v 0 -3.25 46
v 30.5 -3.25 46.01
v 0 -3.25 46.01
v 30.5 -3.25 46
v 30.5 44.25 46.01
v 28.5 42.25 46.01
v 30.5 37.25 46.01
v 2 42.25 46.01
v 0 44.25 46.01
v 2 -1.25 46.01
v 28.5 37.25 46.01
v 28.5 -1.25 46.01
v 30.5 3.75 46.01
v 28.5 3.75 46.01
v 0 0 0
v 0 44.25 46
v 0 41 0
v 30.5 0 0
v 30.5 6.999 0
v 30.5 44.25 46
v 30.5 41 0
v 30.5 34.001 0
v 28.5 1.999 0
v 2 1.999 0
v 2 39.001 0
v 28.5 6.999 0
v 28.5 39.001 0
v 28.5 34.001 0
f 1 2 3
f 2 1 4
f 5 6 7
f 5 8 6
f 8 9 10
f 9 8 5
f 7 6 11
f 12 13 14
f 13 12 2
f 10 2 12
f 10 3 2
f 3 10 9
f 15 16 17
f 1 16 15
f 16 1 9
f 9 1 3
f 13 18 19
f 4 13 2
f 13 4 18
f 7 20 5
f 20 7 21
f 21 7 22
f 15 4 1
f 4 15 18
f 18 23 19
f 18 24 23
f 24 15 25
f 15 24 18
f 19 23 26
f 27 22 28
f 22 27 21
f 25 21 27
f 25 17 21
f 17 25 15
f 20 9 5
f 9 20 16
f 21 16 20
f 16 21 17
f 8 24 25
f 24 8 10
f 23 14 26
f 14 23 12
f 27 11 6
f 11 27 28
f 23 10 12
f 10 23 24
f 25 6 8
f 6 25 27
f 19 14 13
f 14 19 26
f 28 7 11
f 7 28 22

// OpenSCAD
// Barcode holder V2

WT = 43.5;
WB = 37;
T = 46;
D = 26.5;
LIP = 5;

WALL = 2;

WIDTH = WT + 2 * WALL;

SideAngle = sin((WT-WB)/2) * T;
echo(SideAngle);
echo(sin(SideAngle) * T);

//hull() {
//  translate([0,0,T]) linear_extrude(0.01) Top2D();
//  linear_extrude(0.01) Bot2D();
//}

//rotate([0,-45,0])
CBody();

module Mask(wall=0) {
  translate([0,0,-30]) cube([]);
  
}

module CBody() {
  difference() {
    hull() {
      // Bottom
      cube([D + 2*WALL, WB + 2*WALL, 0.01]);
      // Top
      translate([0,-(WT-WB)/2,T]) cube([D + 2*WALL, WT + 2*WALL, 0.01]);
    }
    hull() {
      // Bottom
      translate([WALL,WALL,-0.01]) cube([D,WB, 0.01]);
      // Top
      translate([WALL,WALL-(WT-WB)/2,T+0.01]) cube([D,WT, 0.01]);
    }
    // Front cutout
    hull() {
      // Bottom
      translate([D,WALL+LIP,-0.01]) cube([D,WB - 2*LIP,0.01]);
      // Top
      translate([D,WALL-(WT-WB)/2+LIP,T+0.01]) cube([D,WT - 2*LIP,0.01]);
    }
  }
}


module Top2D() {
  translate([0,-(WT+2*WALL)/2]) difference() {
    square([D + 2*WALL, WT + 2*WALL]);
    translate([WALL,WALL]) square([D,WT]);
    translate([D,WALL+LIP]) square([D,WT-2*LIP]);
  }
}

module Bot2D() {
  translate([0,-(WB+2*WALL)/2]) difference() {
    square([D + 2*WALL, WB + 2*WALL]);
    translate([WALL,WALL]) square([D,WB]);
    translate([D,WALL+LIP]) square([D,WB-2*LIP]);
  }
}
